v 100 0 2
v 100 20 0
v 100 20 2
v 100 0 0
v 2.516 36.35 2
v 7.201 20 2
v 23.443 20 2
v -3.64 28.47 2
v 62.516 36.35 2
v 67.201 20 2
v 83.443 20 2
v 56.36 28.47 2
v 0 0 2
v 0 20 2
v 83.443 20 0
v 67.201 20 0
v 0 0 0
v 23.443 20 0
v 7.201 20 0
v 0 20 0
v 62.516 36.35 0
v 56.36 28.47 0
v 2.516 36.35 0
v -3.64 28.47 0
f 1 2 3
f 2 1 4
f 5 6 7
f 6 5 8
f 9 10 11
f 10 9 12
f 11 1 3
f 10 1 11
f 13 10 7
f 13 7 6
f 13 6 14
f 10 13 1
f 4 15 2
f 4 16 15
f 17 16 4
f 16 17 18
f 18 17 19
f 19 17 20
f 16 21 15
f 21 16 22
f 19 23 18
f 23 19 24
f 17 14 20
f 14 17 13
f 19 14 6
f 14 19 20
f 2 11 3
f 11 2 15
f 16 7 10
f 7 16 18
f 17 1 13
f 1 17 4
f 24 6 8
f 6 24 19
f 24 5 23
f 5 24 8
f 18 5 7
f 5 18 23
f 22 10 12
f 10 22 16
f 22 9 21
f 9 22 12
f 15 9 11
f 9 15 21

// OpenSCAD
cube([100,20,2]);
translate([20,10,0])rotate(15+37,[0,0,1])cube([10,30,2]);
translate([80,10,0])rotate(15+37,[0,0,1])cube([10,30,2]);
